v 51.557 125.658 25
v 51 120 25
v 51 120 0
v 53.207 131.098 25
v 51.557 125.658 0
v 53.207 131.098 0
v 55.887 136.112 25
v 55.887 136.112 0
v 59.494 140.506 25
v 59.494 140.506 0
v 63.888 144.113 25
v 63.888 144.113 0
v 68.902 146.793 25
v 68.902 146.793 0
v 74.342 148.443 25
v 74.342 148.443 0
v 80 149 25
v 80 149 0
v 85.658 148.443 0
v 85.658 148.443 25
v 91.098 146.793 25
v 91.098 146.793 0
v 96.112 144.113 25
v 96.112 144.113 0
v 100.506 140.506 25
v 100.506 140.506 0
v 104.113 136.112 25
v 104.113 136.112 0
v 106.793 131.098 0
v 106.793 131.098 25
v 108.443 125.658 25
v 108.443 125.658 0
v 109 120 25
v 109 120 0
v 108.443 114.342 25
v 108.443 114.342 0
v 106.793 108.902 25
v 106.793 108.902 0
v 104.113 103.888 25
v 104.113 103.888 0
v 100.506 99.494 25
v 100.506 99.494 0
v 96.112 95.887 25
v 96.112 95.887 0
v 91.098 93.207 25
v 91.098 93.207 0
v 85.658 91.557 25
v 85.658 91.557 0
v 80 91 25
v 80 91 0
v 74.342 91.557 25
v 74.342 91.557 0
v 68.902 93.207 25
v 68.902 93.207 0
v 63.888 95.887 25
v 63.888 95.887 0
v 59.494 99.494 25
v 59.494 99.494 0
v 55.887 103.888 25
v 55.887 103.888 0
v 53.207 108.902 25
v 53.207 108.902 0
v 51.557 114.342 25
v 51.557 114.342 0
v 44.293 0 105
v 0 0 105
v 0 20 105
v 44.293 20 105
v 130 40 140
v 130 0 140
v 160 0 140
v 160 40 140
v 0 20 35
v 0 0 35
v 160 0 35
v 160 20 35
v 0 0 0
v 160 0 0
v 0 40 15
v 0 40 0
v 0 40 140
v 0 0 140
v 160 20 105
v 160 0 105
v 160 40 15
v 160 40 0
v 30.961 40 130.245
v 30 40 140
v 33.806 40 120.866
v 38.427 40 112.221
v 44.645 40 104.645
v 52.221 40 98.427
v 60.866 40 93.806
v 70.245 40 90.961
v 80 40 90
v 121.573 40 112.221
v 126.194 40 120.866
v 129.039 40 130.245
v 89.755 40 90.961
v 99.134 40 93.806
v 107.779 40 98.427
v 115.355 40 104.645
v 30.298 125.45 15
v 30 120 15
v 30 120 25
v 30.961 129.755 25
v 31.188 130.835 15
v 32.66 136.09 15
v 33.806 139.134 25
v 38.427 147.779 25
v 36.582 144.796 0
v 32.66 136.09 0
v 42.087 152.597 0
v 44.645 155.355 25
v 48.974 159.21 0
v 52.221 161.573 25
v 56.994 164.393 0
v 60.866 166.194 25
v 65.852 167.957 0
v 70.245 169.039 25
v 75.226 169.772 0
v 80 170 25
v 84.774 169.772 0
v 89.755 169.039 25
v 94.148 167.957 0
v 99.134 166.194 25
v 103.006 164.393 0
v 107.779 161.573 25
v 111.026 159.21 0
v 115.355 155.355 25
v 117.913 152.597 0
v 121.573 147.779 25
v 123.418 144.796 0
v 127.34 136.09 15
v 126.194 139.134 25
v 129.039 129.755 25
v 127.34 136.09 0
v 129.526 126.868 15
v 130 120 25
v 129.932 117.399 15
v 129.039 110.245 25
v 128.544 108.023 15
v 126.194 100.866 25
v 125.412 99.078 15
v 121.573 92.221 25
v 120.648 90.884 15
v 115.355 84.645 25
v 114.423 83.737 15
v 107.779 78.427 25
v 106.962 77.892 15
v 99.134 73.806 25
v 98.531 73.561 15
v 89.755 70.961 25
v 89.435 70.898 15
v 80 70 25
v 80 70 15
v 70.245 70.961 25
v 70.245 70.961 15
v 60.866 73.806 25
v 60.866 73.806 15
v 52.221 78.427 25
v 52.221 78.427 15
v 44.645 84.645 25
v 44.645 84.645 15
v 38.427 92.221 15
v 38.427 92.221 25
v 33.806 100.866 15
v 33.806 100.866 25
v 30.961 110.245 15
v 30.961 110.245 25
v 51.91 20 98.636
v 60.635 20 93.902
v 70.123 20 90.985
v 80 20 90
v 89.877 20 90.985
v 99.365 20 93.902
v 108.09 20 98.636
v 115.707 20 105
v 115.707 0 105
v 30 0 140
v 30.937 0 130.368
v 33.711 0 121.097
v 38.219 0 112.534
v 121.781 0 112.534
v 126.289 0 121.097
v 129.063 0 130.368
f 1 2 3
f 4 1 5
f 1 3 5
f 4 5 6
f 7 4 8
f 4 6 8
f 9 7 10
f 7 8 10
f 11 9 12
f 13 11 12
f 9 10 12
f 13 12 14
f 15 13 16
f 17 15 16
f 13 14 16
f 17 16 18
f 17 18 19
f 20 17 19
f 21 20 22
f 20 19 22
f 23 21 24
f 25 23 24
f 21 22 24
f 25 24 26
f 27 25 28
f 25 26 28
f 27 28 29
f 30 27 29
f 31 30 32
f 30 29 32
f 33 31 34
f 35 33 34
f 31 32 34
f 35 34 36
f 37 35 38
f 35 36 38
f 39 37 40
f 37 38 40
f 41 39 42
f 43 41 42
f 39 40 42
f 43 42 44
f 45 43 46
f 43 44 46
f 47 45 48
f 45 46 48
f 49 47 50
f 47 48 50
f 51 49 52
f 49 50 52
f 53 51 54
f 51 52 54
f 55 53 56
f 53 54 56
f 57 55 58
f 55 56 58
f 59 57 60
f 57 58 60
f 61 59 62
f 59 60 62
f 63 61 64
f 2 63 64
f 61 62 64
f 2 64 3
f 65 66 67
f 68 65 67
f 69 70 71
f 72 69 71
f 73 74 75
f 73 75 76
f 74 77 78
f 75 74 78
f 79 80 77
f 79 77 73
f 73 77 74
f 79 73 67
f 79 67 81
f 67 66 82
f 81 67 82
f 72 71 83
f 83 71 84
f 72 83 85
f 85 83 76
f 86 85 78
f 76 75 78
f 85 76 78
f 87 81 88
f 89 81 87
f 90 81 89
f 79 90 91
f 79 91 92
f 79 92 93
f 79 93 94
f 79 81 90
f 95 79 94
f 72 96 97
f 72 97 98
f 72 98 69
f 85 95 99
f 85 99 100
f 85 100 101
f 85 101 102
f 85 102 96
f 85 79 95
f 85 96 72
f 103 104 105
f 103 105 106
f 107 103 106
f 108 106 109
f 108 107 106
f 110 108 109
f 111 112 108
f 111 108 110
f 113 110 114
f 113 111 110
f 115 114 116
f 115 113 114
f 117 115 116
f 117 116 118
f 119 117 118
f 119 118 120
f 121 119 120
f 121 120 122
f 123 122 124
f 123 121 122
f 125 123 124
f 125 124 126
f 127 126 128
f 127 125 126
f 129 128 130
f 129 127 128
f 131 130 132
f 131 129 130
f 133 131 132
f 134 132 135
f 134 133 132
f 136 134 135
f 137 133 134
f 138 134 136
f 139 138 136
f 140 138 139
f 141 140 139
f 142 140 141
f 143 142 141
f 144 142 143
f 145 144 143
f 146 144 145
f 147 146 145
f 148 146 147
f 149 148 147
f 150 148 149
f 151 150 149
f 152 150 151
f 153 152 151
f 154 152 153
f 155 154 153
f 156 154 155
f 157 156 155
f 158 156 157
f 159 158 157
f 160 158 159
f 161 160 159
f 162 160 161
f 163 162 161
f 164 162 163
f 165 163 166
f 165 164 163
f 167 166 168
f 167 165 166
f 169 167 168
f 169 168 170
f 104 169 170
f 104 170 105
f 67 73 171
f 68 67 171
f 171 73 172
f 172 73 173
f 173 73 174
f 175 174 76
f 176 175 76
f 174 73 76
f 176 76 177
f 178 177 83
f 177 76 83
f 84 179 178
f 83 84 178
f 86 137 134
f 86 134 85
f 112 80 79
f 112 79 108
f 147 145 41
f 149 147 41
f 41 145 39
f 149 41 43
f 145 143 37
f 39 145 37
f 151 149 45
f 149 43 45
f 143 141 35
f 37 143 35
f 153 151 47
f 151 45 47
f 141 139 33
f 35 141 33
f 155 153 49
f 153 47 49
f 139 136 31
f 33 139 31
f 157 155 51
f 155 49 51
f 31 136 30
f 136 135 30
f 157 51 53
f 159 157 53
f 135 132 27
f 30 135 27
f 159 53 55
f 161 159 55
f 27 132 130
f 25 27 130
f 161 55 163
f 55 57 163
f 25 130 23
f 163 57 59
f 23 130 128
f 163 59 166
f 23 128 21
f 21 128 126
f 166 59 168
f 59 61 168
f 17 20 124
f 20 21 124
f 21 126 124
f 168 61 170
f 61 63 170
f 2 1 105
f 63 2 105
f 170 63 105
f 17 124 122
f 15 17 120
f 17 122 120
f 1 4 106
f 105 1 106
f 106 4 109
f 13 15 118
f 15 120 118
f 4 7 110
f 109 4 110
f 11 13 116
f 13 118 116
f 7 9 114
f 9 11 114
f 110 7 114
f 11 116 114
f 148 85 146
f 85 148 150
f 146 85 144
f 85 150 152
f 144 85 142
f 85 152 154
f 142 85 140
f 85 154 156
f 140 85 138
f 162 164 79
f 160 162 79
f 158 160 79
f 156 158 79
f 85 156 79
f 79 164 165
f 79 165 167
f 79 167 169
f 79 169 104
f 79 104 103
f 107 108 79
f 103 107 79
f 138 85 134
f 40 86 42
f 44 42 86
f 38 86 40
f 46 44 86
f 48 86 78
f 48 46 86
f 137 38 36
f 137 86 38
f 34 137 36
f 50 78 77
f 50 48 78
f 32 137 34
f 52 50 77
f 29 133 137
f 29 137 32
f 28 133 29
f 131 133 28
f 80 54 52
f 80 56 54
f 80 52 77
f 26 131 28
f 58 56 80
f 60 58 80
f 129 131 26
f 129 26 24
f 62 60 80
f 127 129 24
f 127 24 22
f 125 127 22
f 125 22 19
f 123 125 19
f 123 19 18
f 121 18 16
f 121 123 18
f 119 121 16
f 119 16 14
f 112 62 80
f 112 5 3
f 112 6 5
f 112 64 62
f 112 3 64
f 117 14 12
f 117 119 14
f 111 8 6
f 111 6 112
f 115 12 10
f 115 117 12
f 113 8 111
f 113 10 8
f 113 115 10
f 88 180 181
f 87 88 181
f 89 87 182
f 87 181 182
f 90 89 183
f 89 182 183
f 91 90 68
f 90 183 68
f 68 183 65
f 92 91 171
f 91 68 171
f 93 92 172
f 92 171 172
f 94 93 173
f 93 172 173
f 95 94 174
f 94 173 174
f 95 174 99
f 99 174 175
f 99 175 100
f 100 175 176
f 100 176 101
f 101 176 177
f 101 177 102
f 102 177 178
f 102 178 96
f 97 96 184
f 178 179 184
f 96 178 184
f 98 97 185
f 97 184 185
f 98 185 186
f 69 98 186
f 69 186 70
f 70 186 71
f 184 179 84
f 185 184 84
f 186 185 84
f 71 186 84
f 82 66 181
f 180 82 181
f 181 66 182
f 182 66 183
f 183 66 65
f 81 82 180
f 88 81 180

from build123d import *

# Parameters (mm, degrees)
EXTRUDE_1_DEPTH          = 40
CUT_EXTRUDE_1_DEPTH      = 217.333076528
CUT_EXTRUDE_1_DEPTH_BACK = 217.333076528
SKETCH_4_W               = 70
SKETCH_4_H               = 20
EXTRUDE_2_DEPTH          = 15
EXTRUDE_3_DEPTH          = 25


with BuildPart() as part:
    # 草图1 → 凸台-拉伸1 (new body)
    with BuildSketch(Plane(origin=(0, 0, 0), x_dir=(1, 0, 0), z_dir=(0, 1, 0))):
        with BuildLine():
            Line((160, 0), (0, 0))
            Line((0, 0), (0, -140))
            Line((0, -140), (30, -140))
            ThreePointArc((30, -140), (80, -90), (130, -140))
            Line((130, -140), (160, -140))
            Line((160, -140), (160, 0))
        make_face()
    extrude(amount=EXTRUDE_1_DEPTH)

    # 草图4 → 切除-拉伸1 (cut, two sides: drawn at the far end of the back side and taken through both)
    with BuildSketch(Plane.ZY.offset(-CUT_EXTRUDE_1_DEPTH_BACK)):
        with Locations((70, 10)):
            Rectangle(SKETCH_4_W, SKETCH_4_H)
    extrude(amount=CUT_EXTRUDE_1_DEPTH + CUT_EXTRUDE_1_DEPTH_BACK, mode=Mode.SUBTRACT)

    # 草图5 → 凸台-拉伸2 (add)
    with BuildSketch(Plane(origin=(0, 0, 0), x_dir=(-1, 0, 0), z_dir=(0, 0, -1))):
        with BuildLine():
            Line((-160, 40), (0, 40))
            Line((0, 40), (-32.659713859, 136.090286141))
            ThreePointArc((-32.659713859, 136.090286141), (-80, 70), (-127.340286141, 136.090286141))
            Line((-127.340286141, 136.090286141), (-160, 40))
        make_face()
    extrude(amount=-EXTRUDE_2_DEPTH)

    # 草图5<3> → 凸台-拉伸3 (add)
    with BuildSketch(Plane(origin=(0, 0, 0), x_dir=(-1, 0, 0), z_dir=(0, 0, -1))):
        with BuildLine():
            ThreePointArc((-127.340286141, 136.090286141), (-120.647966167, 90.883976122), (-80, 70))
            ThreePointArc((-80, 70), (-44.644660941, 84.644660941), (-30, 120))
            ThreePointArc((-30, 120), (-30.669409556, 128.154314593), (-32.659713859, 136.090286141))
            ThreePointArc((-32.659713859, 136.090286141), (-80, 170), (-127.340286141, 136.090286141))
        make_face()
        with BuildLine():
            ThreePointArc((-51, 120), (-59.493903346, 99.493903346), (-80, 91))
            ThreePointArc((-80, 91), (-100.506096654, 140.506096654), (-51, 120))
        make_face(mode=Mode.SUBTRACT)
    extrude(amount=-EXTRUDE_3_DEPTH)


solid = part.part
